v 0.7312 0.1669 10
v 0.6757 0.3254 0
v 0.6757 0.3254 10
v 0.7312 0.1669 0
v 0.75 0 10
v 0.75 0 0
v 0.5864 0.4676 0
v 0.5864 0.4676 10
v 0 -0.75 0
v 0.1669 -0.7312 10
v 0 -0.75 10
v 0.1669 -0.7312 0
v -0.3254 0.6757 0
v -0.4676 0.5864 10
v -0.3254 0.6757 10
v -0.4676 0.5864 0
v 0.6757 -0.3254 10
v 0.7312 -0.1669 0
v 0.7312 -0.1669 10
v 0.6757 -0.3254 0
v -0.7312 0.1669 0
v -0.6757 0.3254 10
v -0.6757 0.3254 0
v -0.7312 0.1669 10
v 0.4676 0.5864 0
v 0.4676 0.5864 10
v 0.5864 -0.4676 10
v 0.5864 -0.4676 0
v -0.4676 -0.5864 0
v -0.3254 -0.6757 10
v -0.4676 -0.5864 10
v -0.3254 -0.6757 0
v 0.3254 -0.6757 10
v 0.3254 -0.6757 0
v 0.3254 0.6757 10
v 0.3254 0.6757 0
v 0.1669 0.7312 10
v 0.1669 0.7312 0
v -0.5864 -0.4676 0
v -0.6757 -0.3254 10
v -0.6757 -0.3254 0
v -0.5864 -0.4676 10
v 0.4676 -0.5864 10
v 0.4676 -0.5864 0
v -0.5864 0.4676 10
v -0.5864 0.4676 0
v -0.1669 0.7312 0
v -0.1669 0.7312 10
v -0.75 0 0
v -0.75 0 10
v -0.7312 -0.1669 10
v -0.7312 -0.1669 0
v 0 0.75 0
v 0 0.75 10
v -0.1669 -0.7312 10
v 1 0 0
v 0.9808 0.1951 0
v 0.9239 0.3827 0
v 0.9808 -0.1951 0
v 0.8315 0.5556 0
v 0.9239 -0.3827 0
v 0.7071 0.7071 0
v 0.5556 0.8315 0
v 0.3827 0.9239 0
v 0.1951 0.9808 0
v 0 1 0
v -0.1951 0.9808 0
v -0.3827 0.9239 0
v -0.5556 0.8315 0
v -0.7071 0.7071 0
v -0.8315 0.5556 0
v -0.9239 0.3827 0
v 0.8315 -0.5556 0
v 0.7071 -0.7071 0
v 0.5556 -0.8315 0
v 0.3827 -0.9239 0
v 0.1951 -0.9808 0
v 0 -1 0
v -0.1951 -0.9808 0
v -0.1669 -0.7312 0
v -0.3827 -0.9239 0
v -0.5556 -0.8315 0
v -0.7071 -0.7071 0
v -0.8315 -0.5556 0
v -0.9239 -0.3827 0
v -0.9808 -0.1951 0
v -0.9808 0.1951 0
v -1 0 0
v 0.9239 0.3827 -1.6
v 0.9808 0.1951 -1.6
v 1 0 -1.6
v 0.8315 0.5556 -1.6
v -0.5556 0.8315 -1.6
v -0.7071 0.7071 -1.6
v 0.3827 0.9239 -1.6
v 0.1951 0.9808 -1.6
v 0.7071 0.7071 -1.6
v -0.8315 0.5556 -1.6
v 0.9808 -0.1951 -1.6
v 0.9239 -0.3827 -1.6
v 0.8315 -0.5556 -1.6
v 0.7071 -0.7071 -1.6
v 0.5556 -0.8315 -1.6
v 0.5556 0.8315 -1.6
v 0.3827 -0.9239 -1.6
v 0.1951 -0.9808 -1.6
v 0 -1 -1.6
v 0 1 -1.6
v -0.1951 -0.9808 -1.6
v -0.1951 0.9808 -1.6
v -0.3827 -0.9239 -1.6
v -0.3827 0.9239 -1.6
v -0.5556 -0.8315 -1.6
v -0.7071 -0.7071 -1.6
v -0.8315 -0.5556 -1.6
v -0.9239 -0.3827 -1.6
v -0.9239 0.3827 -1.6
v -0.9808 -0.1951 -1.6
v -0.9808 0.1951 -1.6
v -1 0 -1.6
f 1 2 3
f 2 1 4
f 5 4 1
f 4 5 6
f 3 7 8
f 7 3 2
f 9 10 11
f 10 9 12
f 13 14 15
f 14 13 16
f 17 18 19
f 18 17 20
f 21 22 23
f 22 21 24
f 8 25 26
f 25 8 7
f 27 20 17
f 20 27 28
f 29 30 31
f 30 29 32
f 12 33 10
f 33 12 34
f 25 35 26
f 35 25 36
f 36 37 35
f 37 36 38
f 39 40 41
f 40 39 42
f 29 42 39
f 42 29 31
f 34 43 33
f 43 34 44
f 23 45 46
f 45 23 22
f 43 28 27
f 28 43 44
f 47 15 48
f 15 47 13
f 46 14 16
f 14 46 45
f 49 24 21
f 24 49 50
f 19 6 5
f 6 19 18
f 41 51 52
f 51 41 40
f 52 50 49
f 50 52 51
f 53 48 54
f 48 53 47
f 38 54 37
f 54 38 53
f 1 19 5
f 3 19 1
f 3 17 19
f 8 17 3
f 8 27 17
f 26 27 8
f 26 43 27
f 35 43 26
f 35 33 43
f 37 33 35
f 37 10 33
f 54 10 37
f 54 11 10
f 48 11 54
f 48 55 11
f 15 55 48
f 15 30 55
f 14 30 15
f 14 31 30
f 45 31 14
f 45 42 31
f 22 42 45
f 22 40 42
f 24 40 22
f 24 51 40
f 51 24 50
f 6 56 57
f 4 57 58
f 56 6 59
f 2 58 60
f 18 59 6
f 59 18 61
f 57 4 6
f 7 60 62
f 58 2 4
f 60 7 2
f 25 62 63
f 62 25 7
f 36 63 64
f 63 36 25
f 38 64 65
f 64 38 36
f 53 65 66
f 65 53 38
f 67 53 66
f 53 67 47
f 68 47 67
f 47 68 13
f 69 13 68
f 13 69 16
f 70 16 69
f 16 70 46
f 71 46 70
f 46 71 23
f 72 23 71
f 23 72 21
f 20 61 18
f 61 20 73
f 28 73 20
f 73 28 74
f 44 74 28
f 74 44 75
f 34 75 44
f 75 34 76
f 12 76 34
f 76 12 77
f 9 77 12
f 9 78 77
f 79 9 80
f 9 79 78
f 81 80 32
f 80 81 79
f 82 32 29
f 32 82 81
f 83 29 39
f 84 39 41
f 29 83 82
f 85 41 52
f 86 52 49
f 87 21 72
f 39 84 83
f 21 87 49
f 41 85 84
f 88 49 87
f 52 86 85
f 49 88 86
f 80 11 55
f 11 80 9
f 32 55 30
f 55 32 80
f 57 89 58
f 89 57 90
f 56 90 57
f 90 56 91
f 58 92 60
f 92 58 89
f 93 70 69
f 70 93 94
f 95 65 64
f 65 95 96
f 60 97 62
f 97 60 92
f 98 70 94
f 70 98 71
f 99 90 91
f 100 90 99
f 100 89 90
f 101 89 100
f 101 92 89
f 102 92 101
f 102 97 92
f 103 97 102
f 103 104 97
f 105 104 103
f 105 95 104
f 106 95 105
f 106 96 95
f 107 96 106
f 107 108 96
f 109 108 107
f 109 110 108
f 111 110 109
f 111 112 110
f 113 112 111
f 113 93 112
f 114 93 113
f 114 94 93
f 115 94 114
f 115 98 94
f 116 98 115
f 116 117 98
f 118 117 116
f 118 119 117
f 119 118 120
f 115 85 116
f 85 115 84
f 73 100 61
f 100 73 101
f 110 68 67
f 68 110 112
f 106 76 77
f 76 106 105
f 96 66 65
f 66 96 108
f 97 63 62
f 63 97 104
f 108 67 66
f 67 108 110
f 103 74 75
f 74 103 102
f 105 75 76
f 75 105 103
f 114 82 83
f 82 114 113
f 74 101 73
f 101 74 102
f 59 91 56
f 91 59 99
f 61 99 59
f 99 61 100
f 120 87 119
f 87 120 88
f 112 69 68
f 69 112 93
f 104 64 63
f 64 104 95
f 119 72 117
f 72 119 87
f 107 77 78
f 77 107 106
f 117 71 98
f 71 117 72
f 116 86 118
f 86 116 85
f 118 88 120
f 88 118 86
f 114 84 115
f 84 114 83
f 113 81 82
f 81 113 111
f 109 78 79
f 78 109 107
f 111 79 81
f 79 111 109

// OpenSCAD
// part_id: exe1
// name: Exeligmos rivet pin for cp2 subassembly
// source_drawing_ids: DRW-009
// units: mm
// revision: 0.1
// SPDX-License-Identifier: MIT

module part_exe1(
    shaft_d = 1.5,
    shaft_h = 10.0,
    head_d = 2.0,
    head_h = 1.6
) {
    union() {
        cylinder(d = shaft_d, h = shaft_h, center = false, $fn = 28);
        translate([0, 0, -head_h]) cylinder(d = head_d, h = head_h, center = false, $fn = 32);
    }
}

// ---- "main guard" ----
// Default to previewing when opened directly:
if (is_undef(__LIB_MODE__)) {
    part_exe1();
}
